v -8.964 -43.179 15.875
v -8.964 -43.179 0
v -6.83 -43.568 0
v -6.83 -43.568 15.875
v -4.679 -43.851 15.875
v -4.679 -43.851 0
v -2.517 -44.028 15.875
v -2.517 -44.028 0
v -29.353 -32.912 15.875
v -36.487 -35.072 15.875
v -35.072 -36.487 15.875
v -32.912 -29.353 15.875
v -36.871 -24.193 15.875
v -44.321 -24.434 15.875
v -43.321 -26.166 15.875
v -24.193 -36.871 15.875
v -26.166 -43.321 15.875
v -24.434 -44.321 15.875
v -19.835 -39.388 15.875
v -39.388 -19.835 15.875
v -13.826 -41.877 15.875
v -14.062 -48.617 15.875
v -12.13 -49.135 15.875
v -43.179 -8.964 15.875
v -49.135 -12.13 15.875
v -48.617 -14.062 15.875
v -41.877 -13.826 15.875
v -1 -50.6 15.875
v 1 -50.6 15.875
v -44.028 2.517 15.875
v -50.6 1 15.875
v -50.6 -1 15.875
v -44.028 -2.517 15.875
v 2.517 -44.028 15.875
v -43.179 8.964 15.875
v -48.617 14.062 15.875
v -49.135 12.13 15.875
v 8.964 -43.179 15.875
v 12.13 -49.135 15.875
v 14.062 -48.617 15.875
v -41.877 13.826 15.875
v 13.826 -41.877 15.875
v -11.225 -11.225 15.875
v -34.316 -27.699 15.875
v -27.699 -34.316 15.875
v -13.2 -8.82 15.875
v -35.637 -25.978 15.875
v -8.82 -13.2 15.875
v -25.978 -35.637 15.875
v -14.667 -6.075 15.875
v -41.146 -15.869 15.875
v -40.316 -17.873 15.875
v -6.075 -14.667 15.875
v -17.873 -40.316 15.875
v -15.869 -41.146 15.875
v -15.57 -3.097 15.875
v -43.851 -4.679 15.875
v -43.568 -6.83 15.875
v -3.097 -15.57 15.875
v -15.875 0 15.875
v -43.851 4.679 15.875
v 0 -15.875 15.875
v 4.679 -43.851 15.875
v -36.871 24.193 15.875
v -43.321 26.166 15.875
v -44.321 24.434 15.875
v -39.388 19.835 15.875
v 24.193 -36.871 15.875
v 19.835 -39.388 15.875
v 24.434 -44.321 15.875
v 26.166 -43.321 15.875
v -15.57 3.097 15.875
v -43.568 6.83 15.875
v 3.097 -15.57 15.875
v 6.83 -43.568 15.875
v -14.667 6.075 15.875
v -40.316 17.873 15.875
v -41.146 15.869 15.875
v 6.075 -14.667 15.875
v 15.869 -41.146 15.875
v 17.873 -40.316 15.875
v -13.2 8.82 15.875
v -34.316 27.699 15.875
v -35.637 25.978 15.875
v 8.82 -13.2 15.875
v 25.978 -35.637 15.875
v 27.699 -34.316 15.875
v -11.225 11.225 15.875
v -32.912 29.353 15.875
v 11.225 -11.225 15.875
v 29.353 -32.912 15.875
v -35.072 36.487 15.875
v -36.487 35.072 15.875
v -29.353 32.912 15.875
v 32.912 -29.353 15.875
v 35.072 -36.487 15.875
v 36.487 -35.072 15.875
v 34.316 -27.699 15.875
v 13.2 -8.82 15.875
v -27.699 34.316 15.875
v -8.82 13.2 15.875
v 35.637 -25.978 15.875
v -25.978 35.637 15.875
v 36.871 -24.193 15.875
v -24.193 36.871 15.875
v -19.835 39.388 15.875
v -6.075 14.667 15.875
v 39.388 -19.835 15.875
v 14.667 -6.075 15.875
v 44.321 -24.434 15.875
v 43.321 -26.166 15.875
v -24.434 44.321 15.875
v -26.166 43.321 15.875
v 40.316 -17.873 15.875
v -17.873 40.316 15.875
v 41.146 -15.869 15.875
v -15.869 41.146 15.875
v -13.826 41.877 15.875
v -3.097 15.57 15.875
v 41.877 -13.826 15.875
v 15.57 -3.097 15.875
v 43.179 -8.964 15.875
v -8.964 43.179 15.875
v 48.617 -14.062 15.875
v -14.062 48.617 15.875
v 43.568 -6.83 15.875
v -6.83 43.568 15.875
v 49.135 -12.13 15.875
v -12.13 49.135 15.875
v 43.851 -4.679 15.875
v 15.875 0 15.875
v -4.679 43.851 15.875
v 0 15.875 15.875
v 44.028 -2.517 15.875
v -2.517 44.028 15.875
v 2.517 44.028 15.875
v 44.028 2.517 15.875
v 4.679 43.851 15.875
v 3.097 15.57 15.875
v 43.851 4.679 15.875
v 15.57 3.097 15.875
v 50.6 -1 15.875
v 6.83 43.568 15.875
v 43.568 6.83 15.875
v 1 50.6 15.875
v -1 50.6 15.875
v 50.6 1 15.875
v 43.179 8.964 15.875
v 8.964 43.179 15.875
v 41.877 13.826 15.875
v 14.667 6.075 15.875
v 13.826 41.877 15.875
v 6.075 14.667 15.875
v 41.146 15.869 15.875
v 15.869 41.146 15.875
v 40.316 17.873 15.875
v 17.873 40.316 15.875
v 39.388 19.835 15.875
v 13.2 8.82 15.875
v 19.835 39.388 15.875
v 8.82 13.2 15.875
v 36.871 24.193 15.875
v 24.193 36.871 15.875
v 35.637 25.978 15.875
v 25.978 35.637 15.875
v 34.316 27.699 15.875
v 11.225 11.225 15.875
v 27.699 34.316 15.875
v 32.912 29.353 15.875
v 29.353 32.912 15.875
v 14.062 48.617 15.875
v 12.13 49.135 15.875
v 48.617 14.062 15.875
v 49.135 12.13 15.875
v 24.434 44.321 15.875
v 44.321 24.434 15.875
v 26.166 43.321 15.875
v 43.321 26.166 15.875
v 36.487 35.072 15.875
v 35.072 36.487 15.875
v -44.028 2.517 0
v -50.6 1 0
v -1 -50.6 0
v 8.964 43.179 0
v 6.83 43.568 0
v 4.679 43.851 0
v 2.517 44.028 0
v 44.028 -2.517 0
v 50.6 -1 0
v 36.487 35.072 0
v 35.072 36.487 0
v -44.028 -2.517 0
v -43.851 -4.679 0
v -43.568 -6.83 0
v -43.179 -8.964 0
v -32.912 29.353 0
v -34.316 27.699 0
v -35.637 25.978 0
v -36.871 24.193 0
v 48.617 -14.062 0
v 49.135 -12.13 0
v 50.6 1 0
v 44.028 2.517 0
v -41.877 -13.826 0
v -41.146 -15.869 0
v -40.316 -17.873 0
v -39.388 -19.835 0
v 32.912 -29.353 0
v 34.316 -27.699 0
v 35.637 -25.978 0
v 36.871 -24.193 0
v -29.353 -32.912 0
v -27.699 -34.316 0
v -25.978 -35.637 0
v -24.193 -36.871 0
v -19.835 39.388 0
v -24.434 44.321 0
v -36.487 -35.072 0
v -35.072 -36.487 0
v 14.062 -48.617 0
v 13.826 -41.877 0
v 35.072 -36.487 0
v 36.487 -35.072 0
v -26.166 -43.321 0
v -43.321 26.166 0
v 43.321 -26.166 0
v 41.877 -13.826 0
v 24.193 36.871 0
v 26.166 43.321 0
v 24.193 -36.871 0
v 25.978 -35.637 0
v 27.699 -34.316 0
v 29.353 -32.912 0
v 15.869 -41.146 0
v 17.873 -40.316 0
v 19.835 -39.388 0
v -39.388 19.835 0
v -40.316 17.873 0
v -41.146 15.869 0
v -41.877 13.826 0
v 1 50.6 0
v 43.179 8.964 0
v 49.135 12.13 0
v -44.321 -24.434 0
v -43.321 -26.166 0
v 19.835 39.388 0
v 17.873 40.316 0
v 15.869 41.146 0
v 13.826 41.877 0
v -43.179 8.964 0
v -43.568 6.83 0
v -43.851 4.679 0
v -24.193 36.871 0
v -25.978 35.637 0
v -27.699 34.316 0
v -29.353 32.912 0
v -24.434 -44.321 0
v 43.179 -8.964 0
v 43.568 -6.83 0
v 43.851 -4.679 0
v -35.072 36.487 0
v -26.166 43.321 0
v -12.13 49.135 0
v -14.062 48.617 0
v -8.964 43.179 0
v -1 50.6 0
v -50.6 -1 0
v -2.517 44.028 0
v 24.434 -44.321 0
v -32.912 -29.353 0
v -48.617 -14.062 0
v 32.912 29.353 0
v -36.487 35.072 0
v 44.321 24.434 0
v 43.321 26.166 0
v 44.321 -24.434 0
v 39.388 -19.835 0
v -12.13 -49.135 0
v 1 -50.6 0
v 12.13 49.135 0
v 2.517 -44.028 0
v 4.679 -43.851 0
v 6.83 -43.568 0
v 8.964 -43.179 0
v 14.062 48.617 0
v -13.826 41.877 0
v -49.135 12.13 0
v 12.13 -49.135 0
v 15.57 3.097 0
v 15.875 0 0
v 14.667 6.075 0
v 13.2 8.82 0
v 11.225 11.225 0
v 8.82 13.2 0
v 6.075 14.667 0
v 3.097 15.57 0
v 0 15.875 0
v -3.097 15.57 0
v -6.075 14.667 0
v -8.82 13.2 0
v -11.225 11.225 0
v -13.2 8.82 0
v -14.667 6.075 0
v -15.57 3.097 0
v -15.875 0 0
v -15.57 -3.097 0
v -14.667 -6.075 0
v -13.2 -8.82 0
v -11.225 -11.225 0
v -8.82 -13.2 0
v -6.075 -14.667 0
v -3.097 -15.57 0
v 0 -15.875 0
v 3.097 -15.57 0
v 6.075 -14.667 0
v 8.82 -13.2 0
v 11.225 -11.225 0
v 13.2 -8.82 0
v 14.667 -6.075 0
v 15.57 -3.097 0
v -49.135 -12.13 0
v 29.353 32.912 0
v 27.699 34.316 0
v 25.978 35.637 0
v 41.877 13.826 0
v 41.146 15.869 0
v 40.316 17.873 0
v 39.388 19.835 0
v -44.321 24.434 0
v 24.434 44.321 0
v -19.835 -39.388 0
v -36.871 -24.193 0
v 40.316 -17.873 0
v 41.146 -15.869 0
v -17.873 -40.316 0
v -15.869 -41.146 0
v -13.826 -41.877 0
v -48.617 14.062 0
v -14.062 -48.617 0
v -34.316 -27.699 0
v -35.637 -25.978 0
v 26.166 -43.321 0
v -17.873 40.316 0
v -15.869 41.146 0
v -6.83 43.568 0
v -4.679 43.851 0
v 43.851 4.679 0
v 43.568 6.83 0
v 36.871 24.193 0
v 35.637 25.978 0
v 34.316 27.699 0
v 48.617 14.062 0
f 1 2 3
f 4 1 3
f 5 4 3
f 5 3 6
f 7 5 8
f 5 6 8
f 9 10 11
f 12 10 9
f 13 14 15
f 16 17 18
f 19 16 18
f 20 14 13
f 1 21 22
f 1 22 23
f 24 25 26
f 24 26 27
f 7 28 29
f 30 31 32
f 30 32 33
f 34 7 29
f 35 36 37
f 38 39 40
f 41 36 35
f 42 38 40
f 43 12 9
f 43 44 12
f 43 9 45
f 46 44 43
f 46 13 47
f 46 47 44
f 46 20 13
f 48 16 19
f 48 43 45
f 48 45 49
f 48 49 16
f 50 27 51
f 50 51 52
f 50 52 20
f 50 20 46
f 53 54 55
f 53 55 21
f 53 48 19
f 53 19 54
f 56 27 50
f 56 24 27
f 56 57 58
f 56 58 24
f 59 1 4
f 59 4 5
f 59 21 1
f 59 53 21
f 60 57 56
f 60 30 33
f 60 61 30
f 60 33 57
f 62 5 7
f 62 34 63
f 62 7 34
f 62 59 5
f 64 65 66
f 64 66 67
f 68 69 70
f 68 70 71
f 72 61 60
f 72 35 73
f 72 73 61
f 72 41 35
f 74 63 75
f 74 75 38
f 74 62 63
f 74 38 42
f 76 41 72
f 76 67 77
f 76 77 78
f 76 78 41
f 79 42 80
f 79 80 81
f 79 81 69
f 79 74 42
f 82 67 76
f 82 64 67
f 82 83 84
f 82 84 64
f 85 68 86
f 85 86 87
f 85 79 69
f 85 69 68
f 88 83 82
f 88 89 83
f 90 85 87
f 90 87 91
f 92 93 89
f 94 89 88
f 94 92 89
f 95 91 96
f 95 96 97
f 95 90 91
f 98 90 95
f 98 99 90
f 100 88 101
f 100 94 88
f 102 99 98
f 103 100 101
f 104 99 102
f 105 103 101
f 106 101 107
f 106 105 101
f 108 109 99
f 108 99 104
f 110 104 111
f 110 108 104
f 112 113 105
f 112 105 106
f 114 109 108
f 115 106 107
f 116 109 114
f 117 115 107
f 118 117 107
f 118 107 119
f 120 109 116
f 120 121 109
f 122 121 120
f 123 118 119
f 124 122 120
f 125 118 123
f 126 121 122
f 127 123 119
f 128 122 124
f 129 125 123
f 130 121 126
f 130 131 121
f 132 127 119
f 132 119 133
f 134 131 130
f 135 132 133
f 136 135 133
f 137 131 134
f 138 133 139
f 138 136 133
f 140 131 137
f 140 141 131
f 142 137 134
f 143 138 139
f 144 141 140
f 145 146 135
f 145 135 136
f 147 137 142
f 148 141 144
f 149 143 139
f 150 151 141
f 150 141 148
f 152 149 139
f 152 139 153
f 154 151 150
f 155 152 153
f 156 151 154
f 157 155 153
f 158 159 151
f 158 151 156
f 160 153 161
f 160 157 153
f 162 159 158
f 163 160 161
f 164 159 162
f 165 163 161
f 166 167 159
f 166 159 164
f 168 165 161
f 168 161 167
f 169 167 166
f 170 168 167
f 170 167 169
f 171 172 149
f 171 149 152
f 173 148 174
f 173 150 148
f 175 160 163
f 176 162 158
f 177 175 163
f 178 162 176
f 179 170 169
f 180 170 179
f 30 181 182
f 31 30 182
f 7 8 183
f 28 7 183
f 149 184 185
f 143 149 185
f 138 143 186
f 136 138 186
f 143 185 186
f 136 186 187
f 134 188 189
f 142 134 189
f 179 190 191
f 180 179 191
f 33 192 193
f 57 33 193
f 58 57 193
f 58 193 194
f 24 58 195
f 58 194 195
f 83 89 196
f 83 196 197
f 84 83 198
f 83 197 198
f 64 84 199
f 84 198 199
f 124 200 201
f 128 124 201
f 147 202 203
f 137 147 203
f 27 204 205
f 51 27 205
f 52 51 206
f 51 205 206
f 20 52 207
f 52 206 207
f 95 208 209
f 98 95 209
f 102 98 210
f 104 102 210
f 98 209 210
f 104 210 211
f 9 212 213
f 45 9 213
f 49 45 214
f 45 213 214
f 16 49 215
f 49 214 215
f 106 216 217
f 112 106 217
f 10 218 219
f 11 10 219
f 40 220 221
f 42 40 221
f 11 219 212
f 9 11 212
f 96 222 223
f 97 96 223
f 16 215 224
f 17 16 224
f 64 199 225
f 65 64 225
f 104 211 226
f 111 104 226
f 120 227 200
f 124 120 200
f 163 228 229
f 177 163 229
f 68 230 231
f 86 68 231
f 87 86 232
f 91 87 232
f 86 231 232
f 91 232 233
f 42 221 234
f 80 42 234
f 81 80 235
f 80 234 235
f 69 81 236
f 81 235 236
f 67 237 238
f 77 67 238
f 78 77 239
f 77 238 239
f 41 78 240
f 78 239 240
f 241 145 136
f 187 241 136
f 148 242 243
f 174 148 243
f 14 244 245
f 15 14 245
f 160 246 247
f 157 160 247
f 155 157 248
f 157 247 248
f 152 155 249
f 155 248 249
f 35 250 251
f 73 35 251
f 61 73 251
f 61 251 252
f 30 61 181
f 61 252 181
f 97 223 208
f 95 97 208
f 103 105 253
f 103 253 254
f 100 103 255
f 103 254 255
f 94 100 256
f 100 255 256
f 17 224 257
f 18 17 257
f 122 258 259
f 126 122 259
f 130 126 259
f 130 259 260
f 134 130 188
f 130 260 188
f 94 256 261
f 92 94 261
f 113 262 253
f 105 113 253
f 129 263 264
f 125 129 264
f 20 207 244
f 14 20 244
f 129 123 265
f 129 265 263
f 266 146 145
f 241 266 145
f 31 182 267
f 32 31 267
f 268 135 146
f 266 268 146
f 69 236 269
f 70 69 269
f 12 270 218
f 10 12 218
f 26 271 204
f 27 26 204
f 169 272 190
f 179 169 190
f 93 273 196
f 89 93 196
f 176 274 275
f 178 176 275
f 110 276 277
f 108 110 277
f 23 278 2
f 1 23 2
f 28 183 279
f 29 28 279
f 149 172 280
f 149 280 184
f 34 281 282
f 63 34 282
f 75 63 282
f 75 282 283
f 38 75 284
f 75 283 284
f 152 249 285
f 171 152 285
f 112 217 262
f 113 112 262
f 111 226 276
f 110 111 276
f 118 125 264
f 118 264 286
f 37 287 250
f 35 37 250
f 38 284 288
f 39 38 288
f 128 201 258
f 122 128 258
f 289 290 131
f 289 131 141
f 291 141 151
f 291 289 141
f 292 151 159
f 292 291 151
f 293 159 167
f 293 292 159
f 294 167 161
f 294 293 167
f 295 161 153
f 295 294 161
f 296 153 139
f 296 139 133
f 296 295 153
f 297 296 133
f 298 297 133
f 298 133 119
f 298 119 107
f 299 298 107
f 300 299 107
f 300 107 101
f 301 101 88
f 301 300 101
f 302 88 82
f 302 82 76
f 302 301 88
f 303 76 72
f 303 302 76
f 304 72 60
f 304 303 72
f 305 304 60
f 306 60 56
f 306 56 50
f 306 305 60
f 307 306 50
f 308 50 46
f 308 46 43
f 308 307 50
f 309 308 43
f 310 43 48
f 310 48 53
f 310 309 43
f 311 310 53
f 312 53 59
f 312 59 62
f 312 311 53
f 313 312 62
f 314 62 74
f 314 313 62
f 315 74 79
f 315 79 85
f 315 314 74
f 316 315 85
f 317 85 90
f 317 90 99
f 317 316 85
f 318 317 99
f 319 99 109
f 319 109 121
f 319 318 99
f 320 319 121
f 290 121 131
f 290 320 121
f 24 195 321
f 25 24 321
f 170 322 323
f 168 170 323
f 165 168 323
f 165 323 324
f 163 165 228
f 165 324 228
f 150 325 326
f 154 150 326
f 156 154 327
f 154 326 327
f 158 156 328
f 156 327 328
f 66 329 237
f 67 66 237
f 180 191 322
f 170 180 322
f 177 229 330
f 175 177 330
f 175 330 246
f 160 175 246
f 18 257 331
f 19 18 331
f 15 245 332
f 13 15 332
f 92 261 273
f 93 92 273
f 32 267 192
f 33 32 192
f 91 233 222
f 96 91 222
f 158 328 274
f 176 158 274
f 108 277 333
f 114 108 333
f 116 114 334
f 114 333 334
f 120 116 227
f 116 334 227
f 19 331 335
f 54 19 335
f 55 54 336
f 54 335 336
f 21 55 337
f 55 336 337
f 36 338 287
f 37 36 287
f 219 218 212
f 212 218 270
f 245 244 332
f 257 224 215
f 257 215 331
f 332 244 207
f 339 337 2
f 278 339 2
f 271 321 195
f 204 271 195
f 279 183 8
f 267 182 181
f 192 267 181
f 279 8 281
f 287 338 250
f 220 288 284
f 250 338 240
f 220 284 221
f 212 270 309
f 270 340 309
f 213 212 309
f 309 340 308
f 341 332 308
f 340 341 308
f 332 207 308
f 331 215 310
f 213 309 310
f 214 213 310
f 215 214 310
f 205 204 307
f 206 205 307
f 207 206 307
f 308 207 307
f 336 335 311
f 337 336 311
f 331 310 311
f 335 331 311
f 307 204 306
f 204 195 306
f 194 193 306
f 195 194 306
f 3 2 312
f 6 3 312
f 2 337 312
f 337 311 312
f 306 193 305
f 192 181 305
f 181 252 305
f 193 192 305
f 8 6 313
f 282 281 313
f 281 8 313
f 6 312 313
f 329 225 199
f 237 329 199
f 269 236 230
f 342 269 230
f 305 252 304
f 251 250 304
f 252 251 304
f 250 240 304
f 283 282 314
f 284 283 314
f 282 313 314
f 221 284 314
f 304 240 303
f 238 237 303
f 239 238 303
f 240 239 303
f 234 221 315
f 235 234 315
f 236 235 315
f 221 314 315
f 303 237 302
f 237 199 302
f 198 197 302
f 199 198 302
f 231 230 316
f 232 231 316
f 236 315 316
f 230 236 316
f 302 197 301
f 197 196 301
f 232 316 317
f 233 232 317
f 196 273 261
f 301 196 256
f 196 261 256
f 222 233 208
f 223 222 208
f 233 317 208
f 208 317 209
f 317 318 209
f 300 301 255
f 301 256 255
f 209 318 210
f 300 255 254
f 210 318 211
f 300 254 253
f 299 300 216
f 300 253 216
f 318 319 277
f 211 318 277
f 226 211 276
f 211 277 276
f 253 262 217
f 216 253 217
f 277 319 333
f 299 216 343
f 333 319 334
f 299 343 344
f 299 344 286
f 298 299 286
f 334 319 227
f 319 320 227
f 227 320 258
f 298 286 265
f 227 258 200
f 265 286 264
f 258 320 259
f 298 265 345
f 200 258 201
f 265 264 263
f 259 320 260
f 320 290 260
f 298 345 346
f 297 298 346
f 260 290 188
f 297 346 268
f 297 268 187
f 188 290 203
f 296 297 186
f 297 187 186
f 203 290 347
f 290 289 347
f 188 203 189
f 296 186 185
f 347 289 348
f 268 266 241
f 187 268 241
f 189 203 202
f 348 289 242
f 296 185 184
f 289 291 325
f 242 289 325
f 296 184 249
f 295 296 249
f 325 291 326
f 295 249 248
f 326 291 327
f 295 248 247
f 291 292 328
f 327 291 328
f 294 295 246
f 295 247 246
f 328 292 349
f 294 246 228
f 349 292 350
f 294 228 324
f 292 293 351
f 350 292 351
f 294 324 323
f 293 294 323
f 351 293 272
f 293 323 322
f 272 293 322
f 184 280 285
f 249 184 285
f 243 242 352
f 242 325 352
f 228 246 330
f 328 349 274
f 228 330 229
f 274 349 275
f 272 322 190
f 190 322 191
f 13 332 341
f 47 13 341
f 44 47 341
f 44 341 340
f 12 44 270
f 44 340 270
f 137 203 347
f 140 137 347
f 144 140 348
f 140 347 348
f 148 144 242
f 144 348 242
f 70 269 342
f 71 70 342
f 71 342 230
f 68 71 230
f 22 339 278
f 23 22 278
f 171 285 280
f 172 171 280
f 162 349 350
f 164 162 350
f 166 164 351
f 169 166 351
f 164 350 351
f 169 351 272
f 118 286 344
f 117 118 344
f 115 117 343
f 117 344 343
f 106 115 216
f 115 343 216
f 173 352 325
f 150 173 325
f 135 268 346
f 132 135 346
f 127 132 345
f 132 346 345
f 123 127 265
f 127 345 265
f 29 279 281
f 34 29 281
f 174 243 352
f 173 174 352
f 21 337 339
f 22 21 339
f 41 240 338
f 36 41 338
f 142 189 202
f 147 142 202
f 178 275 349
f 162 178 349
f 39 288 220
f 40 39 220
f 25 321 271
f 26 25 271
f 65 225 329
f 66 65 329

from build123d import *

# Parameters (mm, degrees)
CROQUIS1_R              = 44.1
CROQUIS1_R_2            = 15.875
SALIENTE_EXTRUIR1_DEPTH = 15.875
SALIENTE_EXTRUIR2_DEPTH = 15.875
MATRIZC1_DEPTH          = 15.875


# Read off the part's stored shape, not the designer's step: MatrizC1
with BuildPart() as part:
    # Croquis1 → Saliente-Extruir1 (new body)
    with BuildSketch(Plane.XY):
        Circle(CROQUIS1_R)
        Circle(CROQUIS1_R_2, mode=Mode.SUBTRACT)
    extrude(amount=SALIENTE_EXTRUIR1_DEPTH)

    # Croquis2 → Saliente-Extruir2 (add)
    with BuildSketch(Plane.XY.offset(15.875)):
        Polygon((-1, 50.6), (1, 50.6), (2.815859205, 42.731276779), (-2.815859205, 42.731276779), align=None)
    extrude(amount=-SALIENTE_EXTRUIR2_DEPTH)

    # MatrizC1 outline → MatrizC1 (add)
    with BuildSketch(Plane.XY):
        with BuildLine():
            ThreePointArc((-13.826153616, 41.876574313), (-11.413919889, 42.59732894), (-8.964486889, 43.179253987))
            Line((-8.964486889, 43.179253987), (-12.130317856, 49.134665855))
            Line((-12.130317856, 49.134665855), (-14.062169508, 48.617027765))
            Line((-14.062169508, 48.617027765), (-13.826153616, 41.876574313))
        make_face()
        with BuildLine():
            ThreePointArc((8.964486889, 43.179253987), (11.413919889, 42.59732894), (13.826153616, 41.876574313))
            Line((13.826153616, 41.876574313), (14.062169508, 48.617027765))
            Line((14.062169508, 48.617027765), (12.130317856, 49.134665855))
            Line((12.130317856, 49.134665855), (8.964486889, 43.179253987))
        make_face()
        with BuildLine():
            ThreePointArc((19.83464269, 39.387776649), (22.05, 38.191720307), (24.193493831, 36.87119277))
            Line((24.193493831, 36.87119277), (26.166025404, 43.320885431))
            Line((26.166025404, 43.320885431), (24.433974596, 44.320885431))
            Line((24.433974596, 44.320885431), (19.83464269, 39.387776649))
        make_face()
        with BuildLine():
            ThreePointArc((29.353100371, 32.912087424), (31.18340905, 31.18340905), (32.912087424, 29.353100371))
            Line((32.912087424, 29.353100371), (36.486709909, 35.072496347))
            Line((36.486709909, 35.072496347), (35.072496347, 36.486709909))
            Line((35.072496347, 36.486709909), (29.353100371, 32.912087424))
        make_face()
        with BuildLine():
            ThreePointArc((36.87119277, 24.193493831), (38.191720307, 22.05), (39.387776649, 19.83464269))
            Line((39.387776649, 19.83464269), (44.320885431, 24.433974596))
            Line((44.320885431, 24.433974596), (43.320885431, 26.166025404))
            Line((43.320885431, 26.166025404), (36.87119277, 24.193493831))
        make_face()
        with BuildLine():
            ThreePointArc((41.876574313, 13.826153616), (42.597328939, 11.413919889), (43.179253986, 8.964486889))
            Line((43.179253986, 8.964486889), (49.134665855, 12.130317856))
            Line((49.134665855, 12.130317856), (48.617027765, 14.062169508))
            Line((48.617027765, 14.062169508), (41.876574313, 13.826153616))
        make_face()
        with BuildLine():
            ThreePointArc((44.028136522, 2.51658388), (44.1, 0), (44.028136522, -2.51658388))
            Line((44.028136522, -2.51658388), (50.6, -1))
            Line((50.6, -1), (50.6, 1))
            Line((50.6, 1), (44.028136522, 2.51658388))
        make_face()
        with BuildLine():
            ThreePointArc((43.179253986, -8.964486889), (42.597328939, -11.413919889), (41.876574313, -13.826153616))
            Line((41.876574313, -13.826153616), (48.617027765, -14.062169508))
            Line((48.617027765, -14.062169508), (49.134665855, -12.130317856))
            Line((49.134665855, -12.130317856), (43.179253986, -8.964486889))
        make_face()
        with BuildLine():
            ThreePointArc((39.387776649, -19.83464269), (38.191720307, -22.05), (36.871192769, -24.193493831))
            Line((36.871192769, -24.193493831), (43.320885431, -26.166025404))
            Line((43.320885431, -26.166025404), (44.320885431, -24.433974596))
            Line((44.320885431, -24.433974596), (39.387776649, -19.83464269))
        make_face()
        with BuildLine():
            ThreePointArc((32.912087424, -29.353100371), (31.18340905, -31.18340905), (29.353100371, -32.912087424))
            Line((29.353100371, -32.912087424), (35.072496347, -36.486709909))
            Line((35.072496347, -36.486709909), (36.486709909, -35.072496347))
            Line((36.486709909, -35.072496347), (32.912087424, -29.353100371))
        make_face()
        with BuildLine():
            ThreePointArc((24.193493831, -36.871192769), (22.05, -38.191720307), (19.83464269, -39.387776649))
            Line((19.83464269, -39.387776649), (24.433974596, -44.320885431))
            Line((24.433974596, -44.320885431), (26.166025404, -43.320885431))
            Line((26.166025404, -43.320885431), (24.193493831, -36.871192769))
        make_face()
        with BuildLine():
            ThreePointArc((13.826153616, -41.876574313), (11.413919889, -42.597328939), (8.964486889, -43.179253986))
            Line((8.964486889, -43.179253986), (12.130317856, -49.134665855))
            Line((12.130317856, -49.134665855), (14.062169508, -48.617027765))
            Line((14.062169508, -48.617027765), (13.826153616, -41.876574313))
        make_face()
        with BuildLine():
            ThreePointArc((2.51658388, -44.028136522), (0, -44.1), (-2.51658388, -44.028136522))
            Line((-2.51658388, -44.028136522), (-1, -50.6))
            Line((-1, -50.6), (1, -50.6))
            Line((1, -50.6), (2.51658388, -44.028136522))
        make_face()
        with BuildLine():
            ThreePointArc((-8.964486889, -43.179253986), (-11.413919889, -42.597328939), (-13.826153616, -41.876574313))
            Line((-13.826153616, -41.876574313), (-14.062169508, -48.617027765))
            Line((-14.062169508, -48.617027765), (-12.130317856, -49.134665855))
            Line((-12.130317856, -49.134665855), (-8.964486889, -43.179253986))
        make_face()
        with BuildLine():
            ThreePointArc((-19.83464269, -39.387776649), (-22.05, -38.191720307), (-24.193493831, -36.871192769))
            Line((-24.193493831, -36.871192769), (-26.166025404, -43.320885431))
            Line((-26.166025404, -43.320885431), (-24.433974596, -44.320885431))
            Line((-24.433974596, -44.320885431), (-19.83464269, -39.387776649))
        make_face()
        with BuildLine():
            ThreePointArc((-29.353100371, -32.912087424), (-31.18340905, -31.18340905), (-32.912087424, -29.353100371))
            Line((-32.912087424, -29.353100371), (-36.486709909, -35.072496347))
            Line((-36.486709909, -35.072496347), (-35.072496347, -36.486709909))
            Line((-35.072496347, -36.486709909), (-29.353100371, -32.912087424))
        make_face()
        with BuildLine():
            ThreePointArc((-36.871192769, -24.193493831), (-38.191720307, -22.05), (-39.387776649, -19.83464269))
            Line((-39.387776649, -19.83464269), (-44.320885431, -24.433974596))
            Line((-44.320885431, -24.433974596), (-43.320885431, -26.166025404))
            Line((-43.320885431, -26.166025404), (-36.871192769, -24.193493831))
        make_face()
        with BuildLine():
            ThreePointArc((-41.876574313, -13.826153616), (-42.597328939, -11.413919889), (-43.179253986, -8.964486889))
            Line((-43.179253986, -8.964486889), (-49.134665855, -12.130317856))
            Line((-49.134665855, -12.130317856), (-48.617027765, -14.062169508))
            Line((-48.617027765, -14.062169508), (-41.876574313, -13.826153616))
        make_face()
        with BuildLine():
            ThreePointArc((-44.028136522, -2.51658388), (-44.1, 0), (-44.028136522, 2.51658388))
            Line((-44.028136522, 2.51658388), (-50.6, 1))
            Line((-50.6, 1), (-50.6, -1))
            Line((-50.6, -1), (-44.028136522, -2.51658388))
        make_face()
        with BuildLine():
            ThreePointArc((-43.179253986, 8.964486889), (-42.597328939, 11.413919889), (-41.876574313, 13.826153616))
            Line((-41.876574313, 13.826153616), (-48.617027765, 14.062169508))
            Line((-48.617027765, 14.062169508), (-49.134665855, 12.130317856))
            Line((-49.134665855, 12.130317856), (-43.179253986, 8.964486889))
        make_face()
        with BuildLine():
            ThreePointArc((-39.387776649, 19.83464269), (-38.191720307, 22.05), (-36.87119277, 24.193493831))
            Line((-36.87119277, 24.193493831), (-43.320885431, 26.166025404))
            Line((-43.320885431, 26.166025404), (-44.320885431, 24.433974596))
            Line((-44.320885431, 24.433974596), (-39.387776649, 19.83464269))
        make_face()
        with BuildLine():
            ThreePointArc((-32.912087424, 29.353100371), (-31.18340905, 31.18340905), (-29.353100371, 32.912087424))
            Line((-29.353100371, 32.912087424), (-35.072496347, 36.486709909))
            Line((-35.072496347, 36.486709909), (-36.486709909, 35.072496347))
            Line((-36.486709909, 35.072496347), (-32.912087424, 29.353100371))
        make_face()
        with BuildLine():
            ThreePointArc((-24.193493831, 36.87119277), (-22.05, 38.191720307), (-19.83464269, 39.387776649))
            Line((-19.83464269, 39.387776649), (-24.433974596, 44.320885431))
            Line((-24.433974596, 44.320885431), (-26.166025404, 43.320885431))
            Line((-26.166025404, 43.320885431), (-24.193493831, 36.87119277))
        make_face()
    extrude(amount=MATRIZC1_DEPTH)


solid = part.part
